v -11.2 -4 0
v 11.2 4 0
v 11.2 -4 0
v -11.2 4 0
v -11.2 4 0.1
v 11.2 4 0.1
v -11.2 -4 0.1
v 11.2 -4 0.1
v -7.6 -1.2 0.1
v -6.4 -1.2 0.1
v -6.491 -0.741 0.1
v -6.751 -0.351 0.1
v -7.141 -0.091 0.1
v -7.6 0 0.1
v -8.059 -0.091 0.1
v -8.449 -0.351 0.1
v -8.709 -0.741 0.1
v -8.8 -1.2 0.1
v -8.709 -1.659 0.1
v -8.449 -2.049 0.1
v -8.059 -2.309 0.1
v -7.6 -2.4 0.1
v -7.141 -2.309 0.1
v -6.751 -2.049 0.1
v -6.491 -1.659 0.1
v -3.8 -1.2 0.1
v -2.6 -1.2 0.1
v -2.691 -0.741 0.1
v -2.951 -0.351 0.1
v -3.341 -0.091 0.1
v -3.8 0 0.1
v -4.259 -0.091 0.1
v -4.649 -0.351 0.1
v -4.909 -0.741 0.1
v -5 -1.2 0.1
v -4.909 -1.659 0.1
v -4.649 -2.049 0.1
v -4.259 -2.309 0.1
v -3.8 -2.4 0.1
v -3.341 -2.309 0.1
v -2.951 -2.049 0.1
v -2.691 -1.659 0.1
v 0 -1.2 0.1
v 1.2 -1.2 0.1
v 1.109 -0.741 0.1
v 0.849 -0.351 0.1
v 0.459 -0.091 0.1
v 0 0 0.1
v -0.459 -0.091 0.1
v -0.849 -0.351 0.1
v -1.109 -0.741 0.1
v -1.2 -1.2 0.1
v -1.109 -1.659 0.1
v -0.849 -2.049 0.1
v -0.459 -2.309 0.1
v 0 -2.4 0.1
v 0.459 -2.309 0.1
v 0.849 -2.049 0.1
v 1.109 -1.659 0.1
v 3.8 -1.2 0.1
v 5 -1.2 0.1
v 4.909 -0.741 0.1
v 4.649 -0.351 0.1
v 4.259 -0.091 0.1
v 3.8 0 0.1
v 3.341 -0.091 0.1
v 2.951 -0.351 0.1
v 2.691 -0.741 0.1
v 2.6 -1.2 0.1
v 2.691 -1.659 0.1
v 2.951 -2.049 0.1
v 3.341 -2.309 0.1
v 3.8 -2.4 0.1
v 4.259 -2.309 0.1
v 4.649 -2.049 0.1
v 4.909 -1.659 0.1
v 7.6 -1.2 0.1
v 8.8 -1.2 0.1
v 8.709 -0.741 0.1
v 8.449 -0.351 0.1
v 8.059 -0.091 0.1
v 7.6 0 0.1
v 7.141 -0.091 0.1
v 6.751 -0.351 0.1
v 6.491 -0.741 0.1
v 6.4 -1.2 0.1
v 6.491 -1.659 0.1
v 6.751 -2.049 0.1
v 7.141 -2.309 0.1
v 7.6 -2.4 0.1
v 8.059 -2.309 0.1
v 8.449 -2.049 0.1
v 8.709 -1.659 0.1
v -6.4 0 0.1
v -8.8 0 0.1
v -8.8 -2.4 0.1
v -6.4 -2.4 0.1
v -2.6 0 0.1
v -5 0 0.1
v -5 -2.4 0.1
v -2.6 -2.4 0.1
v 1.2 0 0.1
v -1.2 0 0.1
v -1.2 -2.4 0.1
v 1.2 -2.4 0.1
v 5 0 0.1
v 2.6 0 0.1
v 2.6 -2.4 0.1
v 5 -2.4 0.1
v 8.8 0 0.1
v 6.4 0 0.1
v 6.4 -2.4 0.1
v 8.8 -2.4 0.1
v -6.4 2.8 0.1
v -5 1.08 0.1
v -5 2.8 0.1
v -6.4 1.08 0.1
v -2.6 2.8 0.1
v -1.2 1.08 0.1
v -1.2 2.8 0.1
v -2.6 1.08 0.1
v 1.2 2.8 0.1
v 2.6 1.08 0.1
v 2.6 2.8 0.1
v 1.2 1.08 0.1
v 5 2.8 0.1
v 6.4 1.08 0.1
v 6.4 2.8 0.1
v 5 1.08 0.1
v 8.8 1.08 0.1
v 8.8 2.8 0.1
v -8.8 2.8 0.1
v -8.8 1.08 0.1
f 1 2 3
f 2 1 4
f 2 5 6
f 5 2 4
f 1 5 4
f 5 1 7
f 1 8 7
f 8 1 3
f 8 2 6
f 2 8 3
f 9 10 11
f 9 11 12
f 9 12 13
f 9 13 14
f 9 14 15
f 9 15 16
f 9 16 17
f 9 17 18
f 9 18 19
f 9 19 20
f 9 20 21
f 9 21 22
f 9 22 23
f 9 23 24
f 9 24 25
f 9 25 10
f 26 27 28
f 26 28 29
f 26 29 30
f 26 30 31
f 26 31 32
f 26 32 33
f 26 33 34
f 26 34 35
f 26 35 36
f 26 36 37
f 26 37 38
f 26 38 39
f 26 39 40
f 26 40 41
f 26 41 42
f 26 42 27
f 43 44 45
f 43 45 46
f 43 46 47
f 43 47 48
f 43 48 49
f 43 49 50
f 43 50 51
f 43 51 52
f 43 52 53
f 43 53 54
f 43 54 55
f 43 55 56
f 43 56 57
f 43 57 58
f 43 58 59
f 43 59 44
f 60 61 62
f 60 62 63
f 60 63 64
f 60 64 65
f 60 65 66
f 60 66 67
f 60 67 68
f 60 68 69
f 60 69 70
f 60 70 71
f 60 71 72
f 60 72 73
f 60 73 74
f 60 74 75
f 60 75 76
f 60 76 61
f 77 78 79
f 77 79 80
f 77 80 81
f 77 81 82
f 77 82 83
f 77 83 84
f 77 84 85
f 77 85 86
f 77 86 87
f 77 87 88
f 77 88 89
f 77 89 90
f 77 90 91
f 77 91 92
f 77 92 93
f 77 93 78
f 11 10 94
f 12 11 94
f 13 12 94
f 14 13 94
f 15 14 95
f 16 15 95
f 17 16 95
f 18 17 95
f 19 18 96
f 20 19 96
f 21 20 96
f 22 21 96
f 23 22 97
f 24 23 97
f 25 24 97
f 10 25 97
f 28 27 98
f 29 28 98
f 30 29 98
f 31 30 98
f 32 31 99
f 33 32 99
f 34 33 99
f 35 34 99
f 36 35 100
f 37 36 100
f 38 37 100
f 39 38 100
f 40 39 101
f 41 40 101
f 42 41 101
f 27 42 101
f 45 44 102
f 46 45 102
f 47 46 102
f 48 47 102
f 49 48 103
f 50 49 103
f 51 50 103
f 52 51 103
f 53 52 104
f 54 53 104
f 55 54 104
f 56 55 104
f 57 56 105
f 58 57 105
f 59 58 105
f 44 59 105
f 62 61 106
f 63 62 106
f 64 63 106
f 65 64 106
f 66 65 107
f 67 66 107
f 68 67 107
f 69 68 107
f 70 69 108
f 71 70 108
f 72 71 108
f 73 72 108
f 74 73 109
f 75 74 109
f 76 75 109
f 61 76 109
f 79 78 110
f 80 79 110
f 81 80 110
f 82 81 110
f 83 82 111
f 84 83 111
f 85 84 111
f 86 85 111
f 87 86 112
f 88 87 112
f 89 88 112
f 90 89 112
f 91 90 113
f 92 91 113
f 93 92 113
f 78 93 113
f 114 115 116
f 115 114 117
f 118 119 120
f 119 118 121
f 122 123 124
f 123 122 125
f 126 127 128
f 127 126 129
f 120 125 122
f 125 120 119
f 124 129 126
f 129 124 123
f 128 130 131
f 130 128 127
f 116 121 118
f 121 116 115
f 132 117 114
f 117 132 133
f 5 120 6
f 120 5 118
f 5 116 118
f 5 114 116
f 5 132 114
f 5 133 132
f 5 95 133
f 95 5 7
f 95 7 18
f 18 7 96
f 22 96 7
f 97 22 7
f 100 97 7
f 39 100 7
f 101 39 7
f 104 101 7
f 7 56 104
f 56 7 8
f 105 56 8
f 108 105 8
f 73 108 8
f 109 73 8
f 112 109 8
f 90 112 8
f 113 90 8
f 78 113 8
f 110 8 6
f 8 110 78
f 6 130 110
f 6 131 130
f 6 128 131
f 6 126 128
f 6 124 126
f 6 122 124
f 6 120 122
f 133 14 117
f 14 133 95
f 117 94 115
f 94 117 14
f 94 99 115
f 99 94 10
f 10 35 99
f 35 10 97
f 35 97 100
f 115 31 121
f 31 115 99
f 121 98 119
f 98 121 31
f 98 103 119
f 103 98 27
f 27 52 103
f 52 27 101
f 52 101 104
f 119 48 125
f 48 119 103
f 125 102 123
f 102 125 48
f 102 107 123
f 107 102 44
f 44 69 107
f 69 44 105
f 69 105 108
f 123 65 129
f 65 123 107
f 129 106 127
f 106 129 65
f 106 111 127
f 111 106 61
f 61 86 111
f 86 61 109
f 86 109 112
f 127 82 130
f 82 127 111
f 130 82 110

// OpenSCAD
// file: ../p/box5-12.scad
use <../lib.scad>
function ldraw_lib__box5_12() = [
// 0 Box with 5 Faces without Any Edges
// 0 Name: box5-12.dat
// 0 Author: Chris Dee [cwdee]
// 0 !LDRAW_ORG Primitive UPDATE 2009-02
// 0 !LICENSE Licensed under CC BY 2.0 and CC BY 4.0 : see CAreadme.txt
// 
// 0 BFC CERTIFY CCW
  [0,"BFC","CERTIFY"],
  [0,"BFC","CCW"],
// 
// 0 !HISTORY 2009-09-03 [PTadmin] Official Update 2009-02
// 
// 
// 4 16 1 1 1 1 1 -1 -1 1 -1 -1 1 1
  [4,16,1,1,1,1,1,-1,-1,1,-1,-1,1,1],
// 4 16 -1 0 1 1 0 1 1 1 1 -1 1 1
  [4,16,-1,0,1,1,0,1,1,1,1,-1,1,1],
// 4 16 -1 0 -1 -1 0 1 -1 1 1 -1 1 -1
  [4,16,-1,0,-1,-1,0,1,-1,1,1,-1,1,-1],
// 4 16 1 0 -1 -1 0 -1 -1 1 -1 1 1 -1
  [4,16,1,0,-1,-1,0,-1,-1,1,-1,1,1,-1],
// 4 16 1 0 1 1 0 -1 1 1 -1 1 1 1
  [4,16,1,0,1,1,0,-1,1,1,-1,1,1,1],
// 0
];
module ldraw_lib__box5_12(step=0, col=false, unit=2/5, alt=false, line=0.2, solid=!$preview)
    makepoly(ldraw_lib__box5_12(), step=step, col=col, unit=unit, alt=alt, line=line, solid=solid);
ldraw_lib__box5_12(line=0.2);
// file: ../p/4-4ndis.scad
use <../lib.scad>
function ldraw_lib__4_4ndis() = [
// 0 Disc Negative 1.0
// 0 Name: 4-4ndis.dat
// 0 Author: James Jessiman
// 0 !LDRAW_ORG Primitive UPDATE 2012-01
// 0 !LICENSE Licensed under CC BY 2.0 and CC BY 4.0 : see CAreadme.txt
// 
// 0 BFC CERTIFY CCW
  [0,"BFC","CERTIFY"],
  [0,"BFC","CCW"],
// 
// 0 !HISTORY 2002-03-23 [sbliss] Added BFC statement; compacted code
// 0 !HISTORY 2002-04-25 [PTadmin] Official Update 2002-02
// 0 !HISTORY 2007-06-24 [PTadmin] Header formatted for Contributor Agreement
// 0 !HISTORY 2008-07-01 [PTadmin] Official Update 2008-01
// 0 !HISTORY 2012-02-16 [Philo] Changed to CCW
// 0 !HISTORY 2012-03-30 [PTadmin] Official Update 2012-01
// 
// 
// 3 16 0.9239 0 0.3827 1 0 0 1 0 1
  [3,16,0.9239,0,0.3827,1,0,0,1,0,1],
// 3 16 0.7071 0 0.7071 0.9239 0 0.3827 1 0 1
  [3,16,0.7071,0,0.7071,0.9239,0,0.3827,1,0,1],
// 3 16 0.3827 0 0.9239 0.7071 0 0.7071 1 0 1
  [3,16,0.3827,0,0.9239,0.7071,0,0.7071,1,0,1],
// 3 16 0 0 1 0.3827 0 0.9239 1 0 1
  [3,16,0,0,1,0.3827,0,0.9239,1,0,1],
// 3 16 -0.3827 0 0.9239 0 0 1 -1 0 1
  [3,16,-0.3827,0,0.9239,0,0,1,-1,0,1],
// 3 16 -0.7071 0 0.7071 -0.3827 0 0.9239 -1 0 1
  [3,16,-0.7071,0,0.7071,-0.3827,0,0.9239,-1,0,1],
// 3 16 -0.9239 0 0.3827 -0.7071 0 0.7071 -1 0 1
  [3,16,-0.9239,0,0.3827,-0.7071,0,0.7071,-1,0,1],
// 3 16 -1 0 0 -0.9239 0 0.3827 -1 0 1
  [3,16,-1,0,0,-0.9239,0,0.3827,-1,0,1],
// 3 16 -0.9239 0 -0.3827 -1 0 0 -1 0 -1
  [3,16,-0.9239,0,-0.3827,-1,0,0,-1,0,-1],
// 3 16 -0.7071 0 -0.7071 -0.9239 0 -0.3827 -1 0 -1
  [3,16,-0.7071,0,-0.7071,-0.9239,0,-0.3827,-1,0,-1],
// 3 16 -0.3827 0 -0.9239 -0.7071 0 -0.7071 -1 0 -1
  [3,16,-0.3827,0,-0.9239,-0.7071,0,-0.7071,-1,0,-1],
// 3 16 0 0 -1 -0.3827 0 -0.9239 -1 0 -1
  [3,16,0,0,-1,-0.3827,0,-0.9239,-1,0,-1],
// 3 16 0.3827 0 -0.9239 0 0 -1 1 0 -1
  [3,16,0.3827,0,-0.9239,0,0,-1,1,0,-1],
// 3 16 0.7071 0 -0.7071 0.3827 0 -0.9239 1 0 -1
  [3,16,0.7071,0,-0.7071,0.3827,0,-0.9239,1,0,-1],
// 3 16 0.9239 0 -0.3827 0.7071 0 -0.7071 1 0 -1
  [3,16,0.9239,0,-0.3827,0.7071,0,-0.7071,1,0,-1],
// 3 16 1 0 0 0.9239 0 -0.3827 1 0 -1
  [3,16,1,0,0,0.9239,0,-0.3827,1,0,-1],
];
module ldraw_lib__4_4ndis(step=0, col=false, unit=2/5, alt=false, line=0.2, solid=!$preview)
    makepoly(ldraw_lib__4_4ndis(), step=step, col=col, unit=unit, alt=alt, line=line, solid=solid);
ldraw_lib__4_4ndis(line=0.2);
// file: ../p/4-4disc.scad
use <../lib.scad>
function ldraw_lib__4_4disc() = [
// 0 Disc 1.0
// 0 Name: 4-4disc.dat
// 0 Author: James Jessiman
// 0 !LDRAW_ORG Primitive UPDATE 2002-02
// 0 !LICENSE Licensed under CC BY 2.0 and CC BY 4.0 : see CAreadme.txt
// 
// 0 BFC CERTIFY CCW
  [0,"BFC","CERTIFY"],
  [0,"BFC","CCW"],
// 
// 0 !HISTORY 1998-12-15 [PTadmin] Official Update 1998-10
// 0 !HISTORY 2002-03-23 [sbliss] Added BFC statement
// 0 !HISTORY 2002-04-25 [PTadmin] Official Update 2002-02
// 0 !HISTORY 2007-06-24 [PTadmin] Header formatted for Contributor Agreement
// 0 !HISTORY 2008-07-01 [PTadmin] Official Update 2008-01
// 
// 
// 3 16 0 0 0 1 0 0 0.9239 0 0.3827
  [3,16,0,0,0,1,0,0,0.9239,0,0.3827],
// 3 16 0 0 0 0.9239 0 0.3827 0.7071 0 0.7071
  [3,16,0,0,0,0.9239,0,0.3827,0.7071,0,0.7071],
// 3 16 0 0 0 0.7071 0 0.7071 0.3827 0 0.9239
  [3,16,0,0,0,0.7071,0,0.7071,0.3827,0,0.9239],
// 3 16 0 0 0 0.3827 0 0.9239 0 0 1
  [3,16,0,0,0,0.3827,0,0.9239,0,0,1],
// 3 16 0 0 0 0 0 1 -0.3827 0 0.9239
  [3,16,0,0,0,0,0,1,-0.3827,0,0.9239],
// 3 16 0 0 0 -0.3827 0 0.9239 -0.7071 0 0.7071
  [3,16,0,0,0,-0.3827,0,0.9239,-0.7071,0,0.7071],
// 3 16 0 0 0 -0.7071 0 0.7071 -0.9239 0 0.3827
  [3,16,0,0,0,-0.7071,0,0.7071,-0.9239,0,0.3827],
// 3 16 0 0 0 -0.9239 0 0.3827 -1 0 -0
  [3,16,0,0,0,-0.9239,0,0.3827,-1,0,-0],
// 3 16 0 0 0 -1 0 -0 -0.9239 0 -0.3827
  [3,16,0,0,0,-1,0,-0,-0.9239,0,-0.3827],
// 3 16 0 0 0 -0.9239 0 -0.3827 -0.7071 0 -0.7071
  [3,16,0,0,0,-0.9239,0,-0.3827,-0.7071,0,-0.7071],
// 3 16 0 0 0 -0.7071 0 -0.7071 -0.3827 0 -0.9239
  [3,16,0,0,0,-0.7071,0,-0.7071,-0.3827,0,-0.9239],
// 3 16 0 0 0 -0.3827 0 -0.9239 0 0 -1
  [3,16,0,0,0,-0.3827,0,-0.9239,0,0,-1],
// 3 16 0 0 0 0 0 -1 0.3827 0 -0.9239
  [3,16,0,0,0,0,0,-1,0.3827,0,-0.9239],
// 3 16 0 0 0 0.3827 0 -0.9239 0.7071 0 -0.7071
  [3,16,0,0,0,0.3827,0,-0.9239,0.7071,0,-0.7071],
// 3 16 0 0 0 0.7071 0 -0.7071 0.9239 0 -0.3827
  [3,16,0,0,0,0.7071,0,-0.7071,0.9239,0,-0.3827],
// 3 16 0 0 0 0.9239 0 -0.3827 1 0 0
  [3,16,0,0,0,0.9239,0,-0.3827,1,0,0],
// 0
];
module ldraw_lib__4_4disc(step=0, col=false, unit=2/5, alt=false, line=0.2, solid=!$preview)
    makepoly(ldraw_lib__4_4disc(), step=step, col=col, unit=unit, alt=alt, line=line, solid=solid);
ldraw_lib__4_4disc(line=0.2);
// main file
use <../lib.scad>
use <../p/4-4disc.scad>
use <../p/4-4ndis.scad>
use <../p/box5-12.scad>
function ldraw_lib__194305a() = [
// 0 Sticker  1 x  2.8 with Five White Squares and Five Yellow Circles on Black Background
// 0 Name: 194305a.dat
// 0 Author: Takeshi Takahashi [RainbowDolphin]
// 0 !LDRAW_ORG Part UPDATE 2022-05
// 0 !LICENSE Licensed under CC BY 2.0 and CC BY 4.0 : see CAreadme.txt
// 
// 0 BFC CERTIFY CCW
  [0,"BFC","CERTIFY"],
  [0,"BFC","CCW"],
// 
// 0 !KEYWORDS Fire boat, Set 4025
// 
// 0 !HISTORY 2021-09-09 [RainbowDolphin] Created based on 192895a by Bjoern Sigve Storesund [Storesund]
// 0 !HISTORY 2022-09-15 [PTadmin] Official Update 2022-05
// 
// 
// 1 16 0 -0.25 0 28 0 0 0 0.25 0 0 0 10 box5-12.dat
  [1,16,0,-0.25,0,28,0,0,0,0.25,0,0,0,10, ldraw_lib__box5_12()],
// 1 14 -19 -0.25 -3 3 0 0 0 1 0 0 0 3 4-4disc.dat
  [1,14,-19,-0.25,-3,3,0,0,0,1,0,0,0,3, ldraw_lib__4_4disc()],
// 1 14 -9.5 -0.25 -3 3 0 0 0 1 0 0 0 3 4-4disc.dat
  [1,14,-9.5,-0.25,-3,3,0,0,0,1,0,0,0,3, ldraw_lib__4_4disc()],
// 1 14 0 -0.25 -3 3 0 0 0 1 0 0 0 3 4-4disc.dat
  [1,14,0,-0.25,-3,3,0,0,0,1,0,0,0,3, ldraw_lib__4_4disc()],
// 1 14 9.5 -0.25 -3 3 0 0 0 1 0 0 0 3 4-4disc.dat
  [1,14,9.5,-0.25,-3,3,0,0,0,1,0,0,0,3, ldraw_lib__4_4disc()],
// 1 14 19 -0.25 -3 3 0 0 0 1 0 0 0 3 4-4disc.dat
  [1,14,19,-0.25,-3,3,0,0,0,1,0,0,0,3, ldraw_lib__4_4disc()],
// 1 0 -19 -0.25 -3 3 0 0 0 1 0 0 0 3 4-4ndis.dat
  [1,0,-19,-0.25,-3,3,0,0,0,1,0,0,0,3, ldraw_lib__4_4ndis()],
// 1 0 -9.5 -0.25 -3 3 0 0 0 1 0 0 0 3 4-4ndis.dat
  [1,0,-9.5,-0.25,-3,3,0,0,0,1,0,0,0,3, ldraw_lib__4_4ndis()],
// 1 0 0 -0.25 -3 3 0 0 0 1 0 0 0 3 4-4ndis.dat
  [1,0,0,-0.25,-3,3,0,0,0,1,0,0,0,3, ldraw_lib__4_4ndis()],
// 1 0 9.5 -0.25 -3 3 0 0 0 1 0 0 0 3 4-4ndis.dat
  [1,0,9.5,-0.25,-3,3,0,0,0,1,0,0,0,3, ldraw_lib__4_4ndis()],
// 1 0 19 -0.25 -3 3 0 0 0 1 0 0 0 3 4-4ndis.dat
  [1,0,19,-0.25,-3,3,0,0,0,1,0,0,0,3, ldraw_lib__4_4ndis()],
// 4 0 -12.5 -0.25 2.7 -12.5 -0.25 7 -16 -0.25 7 -16 -0.25 2.7
  [4,0,-12.5,-0.25,2.7,-12.5,-0.25,7,-16,-0.25,7,-16,-0.25,2.7],
// 4 0 -3 -0.25 2.7 -3 -0.25 7 -6.5 -0.25 7 -6.5 -0.25 2.7
  [4,0,-3,-0.25,2.7,-3,-0.25,7,-6.5,-0.25,7,-6.5,-0.25,2.7],
// 4 0 6.5 -0.25 2.7 6.5 -0.25 7 3 -0.25 7 3 -0.25 2.7
  [4,0,6.5,-0.25,2.7,6.5,-0.25,7,3,-0.25,7,3,-0.25,2.7],
// 4 0 16 -0.25 2.7 16 -0.25 7 12.5 -0.25 7 12.5 -0.25 2.7
  [4,0,16,-0.25,2.7,16,-0.25,7,12.5,-0.25,7,12.5,-0.25,2.7],
// 4 15 3 -0.25 2.7 3 -0.25 7 -3 -0.25 7 -3 -0.25 2.7
  [4,15,3,-0.25,2.7,3,-0.25,7,-3,-0.25,7,-3,-0.25,2.7],
// 4 15 12.5 -0.25 2.7 12.5 -0.25 7 6.5 -0.25 7 6.5 -0.25 2.7
  [4,15,12.5,-0.25,2.7,12.5,-0.25,7,6.5,-0.25,7,6.5,-0.25,2.7],
// 4 15 22 -0.25 2.7 22 -0.25 7 16 -0.25 7 16 -0.25 2.7
  [4,15,22,-0.25,2.7,22,-0.25,7,16,-0.25,7,16,-0.25,2.7],
// 4 15 -6.5 -0.25 2.7 -6.5 -0.25 7 -12.5 -0.25 7 -12.5 -0.25 2.7
  [4,15,-6.5,-0.25,2.7,-6.5,-0.25,7,-12.5,-0.25,7,-12.5,-0.25,2.7],
// 4 15 -16 -0.25 2.7 -16 -0.25 7 -22 -0.25 7 -22 -0.25 2.7
  [4,15,-16,-0.25,2.7,-16,-0.25,7,-22,-0.25,7,-22,-0.25,2.7],
// 4 0 -3 -0.25 7 28 -0.25 10 -28 -0.25 10 -6.5 -0.25 7
  [4,0,-3,-0.25,7,28,-0.25,10,-28,-0.25,10,-6.5,-0.25,7],
// 3 0 -28 -0.25 10 -12.5 -0.25 7 -6.5 -0.25 7
  [3,0,-28,-0.25,10,-12.5,-0.25,7,-6.5,-0.25,7],
// 3 0 -28 -0.25 10 -16 -0.25 7 -12.5 -0.25 7
  [3,0,-28,-0.25,10,-16,-0.25,7,-12.5,-0.25,7],
// 3 0 -28 -0.25 10 -22 -0.25 7 -16 -0.25 7
  [3,0,-28,-0.25,10,-22,-0.25,7,-16,-0.25,7],
// 3 0 -28 -0.25 10 -22 -0.25 2.7 -22 -0.25 7
  [3,0,-28,-0.25,10,-22,-0.25,2.7,-22,-0.25,7],
// 4 0 -22 -0.25 0 -22 -0.25 2.7 -28 -0.25 10 -28 -0.25 -10
  [4,0,-22,-0.25,0,-22,-0.25,2.7,-28,-0.25,10,-28,-0.25,-10],
// 3 0 -22 -0.25 0 -28 -0.25 -10 -22 -0.25 -3
  [3,0,-22,-0.25,0,-28,-0.25,-10,-22,-0.25,-3],
// 3 0 -22 -0.25 -3 -28 -0.25 -10 -22 -0.25 -6
  [3,0,-22,-0.25,-3,-28,-0.25,-10,-22,-0.25,-6],
// 3 0 -19 -0.25 -6 -22 -0.25 -6 -28 -0.25 -10
  [3,0,-19,-0.25,-6,-22,-0.25,-6,-28,-0.25,-10],
// 3 0 -16 -0.25 -6 -19 -0.25 -6 -28 -0.25 -10
  [3,0,-16,-0.25,-6,-19,-0.25,-6,-28,-0.25,-10],
// 3 0 -12.5 -0.25 -6 -16 -0.25 -6 -28 -0.25 -10
  [3,0,-12.5,-0.25,-6,-16,-0.25,-6,-28,-0.25,-10],
// 3 0 -9.5 -0.25 -6 -12.5 -0.25 -6 -28 -0.25 -10
  [3,0,-9.5,-0.25,-6,-12.5,-0.25,-6,-28,-0.25,-10],
// 3 0 -6.5 -0.25 -6 -9.5 -0.25 -6 -28 -0.25 -10
  [3,0,-6.5,-0.25,-6,-9.5,-0.25,-6,-28,-0.25,-10],
// 3 0 -3 -0.25 -6 -6.5 -0.25 -6 -28 -0.25 -10
  [3,0,-3,-0.25,-6,-6.5,-0.25,-6,-28,-0.25,-10],
// 4 0 0 -0.25 -6 -3 -0.25 -6 -28 -0.25 -10 28 -0.25 -10
  [4,0,0,-0.25,-6,-3,-0.25,-6,-28,-0.25,-10,28,-0.25,-10],
// 3 0 3 -0.25 -6 0 -0.25 -6 28 -0.25 -10
  [3,0,3,-0.25,-6,0,-0.25,-6,28,-0.25,-10],
// 3 0 6.5 -0.25 -6 3 -0.25 -6 28 -0.25 -10
  [3,0,6.5,-0.25,-6,3,-0.25,-6,28,-0.25,-10],
// 3 0 9.5 -0.25 -6 6.5 -0.25 -6 28 -0.25 -10
  [3,0,9.5,-0.25,-6,6.5,-0.25,-6,28,-0.25,-10],
// 3 0 12.5 -0.25 -6 9.5 -0.25 -6 28 -0.25 -10
  [3,0,12.5,-0.25,-6,9.5,-0.25,-6,28,-0.25,-10],
// 3 0 16 -0.25 -6 12.5 -0.25 -6 28 -0.25 -10
  [3,0,16,-0.25,-6,12.5,-0.25,-6,28,-0.25,-10],
// 3 0 19 -0.25 -6 16 -0.25 -6 28 -0.25 -10
  [3,0,19,-0.25,-6,16,-0.25,-6,28,-0.25,-10],
// 3 0 22 -0.25 -6 19 -0.25 -6 28 -0.25 -10
  [3,0,22,-0.25,-6,19,-0.25,-6,28,-0.25,-10],
// 3 0 22 -0.25 -3 22 -0.25 -6 28 -0.25 -10
  [3,0,22,-0.25,-3,22,-0.25,-6,28,-0.25,-10],
// 4 0 22 -0.25 0 22 -0.25 -3 28 -0.25 -10 28 -0.25 10
  [4,0,22,-0.25,0,22,-0.25,-3,28,-0.25,-10,28,-0.25,10],
// 3 0 28 -0.25 10 22 -0.25 2.7 22 -0.25 0
  [3,0,28,-0.25,10,22,-0.25,2.7,22,-0.25,0],
// 3 0 28 -0.25 10 22 -0.25 7 22 -0.25 2.7
  [3,0,28,-0.25,10,22,-0.25,7,22,-0.25,2.7],
// 3 0 28 -0.25 10 16 -0.25 7 22 -0.25 7
  [3,0,28,-0.25,10,16,-0.25,7,22,-0.25,7],
// 3 0 28 -0.25 10 12.5 -0.25 7 16 -0.25 7
  [3,0,28,-0.25,10,12.5,-0.25,7,16,-0.25,7],
// 3 0 28 -0.25 10 6.5 -0.25 7 12.5 -0.25 7
  [3,0,28,-0.25,10,6.5,-0.25,7,12.5,-0.25,7],
// 3 0 28 -0.25 10 3 -0.25 7 6.5 -0.25 7
  [3,0,28,-0.25,10,3,-0.25,7,6.5,-0.25,7],
// 3 0 28 -0.25 10 -3 -0.25 7 3 -0.25 7
  [3,0,28,-0.25,10,-3,-0.25,7,3,-0.25,7],
// 4 0 -22 -0.25 2.7 -22 -0.25 0 -19 -0.25 0 -16 -0.25 2.7
  [4,0,-22,-0.25,2.7,-22,-0.25,0,-19,-0.25,0,-16,-0.25,2.7],
// 4 0 -16 -0.25 2.7 -19 -0.25 0 -16 -0.25 0 -12.5 -0.25 2.7
  [4,0,-16,-0.25,2.7,-19,-0.25,0,-16,-0.25,0,-12.5,-0.25,2.7],
// 4 0 -12.5 -0.25 0 -12.5 -0.25 2.7 -16 -0.25 0 -16 -0.25 -3
  [4,0,-12.5,-0.25,0,-12.5,-0.25,2.7,-16,-0.25,0,-16,-0.25,-3],
// 4 0 -12.5 -0.25 -3 -12.5 -0.25 0 -16 -0.25 -3 -16 -0.25 -6
  [4,0,-12.5,-0.25,-3,-12.5,-0.25,0,-16,-0.25,-3,-16,-0.25,-6],
// 3 0 -12.5 -0.25 -3 -16 -0.25 -6 -12.5 -0.25 -6
  [3,0,-12.5,-0.25,-3,-16,-0.25,-6,-12.5,-0.25,-6],
// 4 0 -12.5 -0.25 2.7 -12.5 -0.25 0 -9.5 -0.25 0 -6.5 -0.25 2.7
  [4,0,-12.5,-0.25,2.7,-12.5,-0.25,0,-9.5,-0.25,0,-6.5,-0.25,2.7],
// 4 0 -6.5 -0.25 2.7 -9.5 -0.25 0 -6.5 -0.25 0 -3 -0.25 2.7
  [4,0,-6.5,-0.25,2.7,-9.5,-0.25,0,-6.5,-0.25,0,-3,-0.25,2.7],
// 4 0 -3 -0.25 0 -3 -0.25 2.7 -6.5 -0.25 0 -6.5 -0.25 -3
  [4,0,-3,-0.25,0,-3,-0.25,2.7,-6.5,-0.25,0,-6.5,-0.25,-3],
// 4 0 -3 -0.25 -3 -3 -0.25 0 -6.5 -0.25 -3 -6.5 -0.25 -6
  [4,0,-3,-0.25,-3,-3,-0.25,0,-6.5,-0.25,-3,-6.5,-0.25,-6],
// 3 0 -3 -0.25 -3 -6.5 -0.25 -6 -3 -0.25 -6
  [3,0,-3,-0.25,-3,-6.5,-0.25,-6,-3,-0.25,-6],
// 4 0 -3 -0.25 2.7 -3 -0.25 0 0 -0.25 0 3 -0.25 2.7
  [4,0,-3,-0.25,2.7,-3,-0.25,0,0,-0.25,0,3,-0.25,2.7],
// 4 0 3 -0.25 2.7 0 -0.25 0 3 -0.25 0 6.5 -0.25 2.7
  [4,0,3,-0.25,2.7,0,-0.25,0,3,-0.25,0,6.5,-0.25,2.7],
// 4 0 6.5 -0.25 0 6.5 -0.25 2.7 3 -0.25 0 3 -0.25 -3
  [4,0,6.5,-0.25,0,6.5,-0.25,2.7,3,-0.25,0,3,-0.25,-3],
// 4 0 6.5 -0.25 -3 6.5 -0.25 0 3 -0.25 -3 3 -0.25 -6
  [4,0,6.5,-0.25,-3,6.5,-0.25,0,3,-0.25,-3,3,-0.25,-6],
// 3 0 6.5 -0.25 -3 3 -0.25 -6 6.5 -0.25 -6
  [3,0,6.5,-0.25,-3,3,-0.25,-6,6.5,-0.25,-6],
// 4 0 6.5 -0.25 2.7 6.5 -0.25 0 9.5 -0.25 0 12.5 -0.25 2.7
  [4,0,6.5,-0.25,2.7,6.5,-0.25,0,9.5,-0.25,0,12.5,-0.25,2.7],
// 4 0 12.5 -0.25 2.7 9.5 -0.25 0 12.5 -0.25 0 16 -0.25 2.7
  [4,0,12.5,-0.25,2.7,9.5,-0.25,0,12.5,-0.25,0,16,-0.25,2.7],
// 4 0 16 -0.25 0 16 -0.25 2.7 12.5 -0.25 0 12.5 -0.25 -3
  [4,0,16,-0.25,0,16,-0.25,2.7,12.5,-0.25,0,12.5,-0.25,-3],
// 4 0 16 -0.25 -3 16 -0.25 0 12.5 -0.25 -3 12.5 -0.25 -6
  [4,0,16,-0.25,-3,16,-0.25,0,12.5,-0.25,-3,12.5,-0.25,-6],
// 3 0 16 -0.25 -3 12.5 -0.25 -6 16 -0.25 -6
  [3,0,16,-0.25,-3,12.5,-0.25,-6,16,-0.25,-6],
// 4 0 16 -0.25 2.7 16 -0.25 0 19 -0.25 0 22 -0.25 2.7
  [4,0,16,-0.25,2.7,16,-0.25,0,19,-0.25,0,22,-0.25,2.7],
// 3 0 22 -0.25 2.7 19 -0.25 0 22 -0.25 0
  [3,0,22,-0.25,2.7,19,-0.25,0,22,-0.25,0],
];
module ldraw_lib__194305a(step=0, col=false, unit=2/5, alt=false, line=0.2, solid=!$preview)
    makepoly(ldraw_lib__194305a(), step=step, col=col, unit=unit, alt=alt, line=line, solid=solid);
ldraw_lib__194305a(line=0.2);
